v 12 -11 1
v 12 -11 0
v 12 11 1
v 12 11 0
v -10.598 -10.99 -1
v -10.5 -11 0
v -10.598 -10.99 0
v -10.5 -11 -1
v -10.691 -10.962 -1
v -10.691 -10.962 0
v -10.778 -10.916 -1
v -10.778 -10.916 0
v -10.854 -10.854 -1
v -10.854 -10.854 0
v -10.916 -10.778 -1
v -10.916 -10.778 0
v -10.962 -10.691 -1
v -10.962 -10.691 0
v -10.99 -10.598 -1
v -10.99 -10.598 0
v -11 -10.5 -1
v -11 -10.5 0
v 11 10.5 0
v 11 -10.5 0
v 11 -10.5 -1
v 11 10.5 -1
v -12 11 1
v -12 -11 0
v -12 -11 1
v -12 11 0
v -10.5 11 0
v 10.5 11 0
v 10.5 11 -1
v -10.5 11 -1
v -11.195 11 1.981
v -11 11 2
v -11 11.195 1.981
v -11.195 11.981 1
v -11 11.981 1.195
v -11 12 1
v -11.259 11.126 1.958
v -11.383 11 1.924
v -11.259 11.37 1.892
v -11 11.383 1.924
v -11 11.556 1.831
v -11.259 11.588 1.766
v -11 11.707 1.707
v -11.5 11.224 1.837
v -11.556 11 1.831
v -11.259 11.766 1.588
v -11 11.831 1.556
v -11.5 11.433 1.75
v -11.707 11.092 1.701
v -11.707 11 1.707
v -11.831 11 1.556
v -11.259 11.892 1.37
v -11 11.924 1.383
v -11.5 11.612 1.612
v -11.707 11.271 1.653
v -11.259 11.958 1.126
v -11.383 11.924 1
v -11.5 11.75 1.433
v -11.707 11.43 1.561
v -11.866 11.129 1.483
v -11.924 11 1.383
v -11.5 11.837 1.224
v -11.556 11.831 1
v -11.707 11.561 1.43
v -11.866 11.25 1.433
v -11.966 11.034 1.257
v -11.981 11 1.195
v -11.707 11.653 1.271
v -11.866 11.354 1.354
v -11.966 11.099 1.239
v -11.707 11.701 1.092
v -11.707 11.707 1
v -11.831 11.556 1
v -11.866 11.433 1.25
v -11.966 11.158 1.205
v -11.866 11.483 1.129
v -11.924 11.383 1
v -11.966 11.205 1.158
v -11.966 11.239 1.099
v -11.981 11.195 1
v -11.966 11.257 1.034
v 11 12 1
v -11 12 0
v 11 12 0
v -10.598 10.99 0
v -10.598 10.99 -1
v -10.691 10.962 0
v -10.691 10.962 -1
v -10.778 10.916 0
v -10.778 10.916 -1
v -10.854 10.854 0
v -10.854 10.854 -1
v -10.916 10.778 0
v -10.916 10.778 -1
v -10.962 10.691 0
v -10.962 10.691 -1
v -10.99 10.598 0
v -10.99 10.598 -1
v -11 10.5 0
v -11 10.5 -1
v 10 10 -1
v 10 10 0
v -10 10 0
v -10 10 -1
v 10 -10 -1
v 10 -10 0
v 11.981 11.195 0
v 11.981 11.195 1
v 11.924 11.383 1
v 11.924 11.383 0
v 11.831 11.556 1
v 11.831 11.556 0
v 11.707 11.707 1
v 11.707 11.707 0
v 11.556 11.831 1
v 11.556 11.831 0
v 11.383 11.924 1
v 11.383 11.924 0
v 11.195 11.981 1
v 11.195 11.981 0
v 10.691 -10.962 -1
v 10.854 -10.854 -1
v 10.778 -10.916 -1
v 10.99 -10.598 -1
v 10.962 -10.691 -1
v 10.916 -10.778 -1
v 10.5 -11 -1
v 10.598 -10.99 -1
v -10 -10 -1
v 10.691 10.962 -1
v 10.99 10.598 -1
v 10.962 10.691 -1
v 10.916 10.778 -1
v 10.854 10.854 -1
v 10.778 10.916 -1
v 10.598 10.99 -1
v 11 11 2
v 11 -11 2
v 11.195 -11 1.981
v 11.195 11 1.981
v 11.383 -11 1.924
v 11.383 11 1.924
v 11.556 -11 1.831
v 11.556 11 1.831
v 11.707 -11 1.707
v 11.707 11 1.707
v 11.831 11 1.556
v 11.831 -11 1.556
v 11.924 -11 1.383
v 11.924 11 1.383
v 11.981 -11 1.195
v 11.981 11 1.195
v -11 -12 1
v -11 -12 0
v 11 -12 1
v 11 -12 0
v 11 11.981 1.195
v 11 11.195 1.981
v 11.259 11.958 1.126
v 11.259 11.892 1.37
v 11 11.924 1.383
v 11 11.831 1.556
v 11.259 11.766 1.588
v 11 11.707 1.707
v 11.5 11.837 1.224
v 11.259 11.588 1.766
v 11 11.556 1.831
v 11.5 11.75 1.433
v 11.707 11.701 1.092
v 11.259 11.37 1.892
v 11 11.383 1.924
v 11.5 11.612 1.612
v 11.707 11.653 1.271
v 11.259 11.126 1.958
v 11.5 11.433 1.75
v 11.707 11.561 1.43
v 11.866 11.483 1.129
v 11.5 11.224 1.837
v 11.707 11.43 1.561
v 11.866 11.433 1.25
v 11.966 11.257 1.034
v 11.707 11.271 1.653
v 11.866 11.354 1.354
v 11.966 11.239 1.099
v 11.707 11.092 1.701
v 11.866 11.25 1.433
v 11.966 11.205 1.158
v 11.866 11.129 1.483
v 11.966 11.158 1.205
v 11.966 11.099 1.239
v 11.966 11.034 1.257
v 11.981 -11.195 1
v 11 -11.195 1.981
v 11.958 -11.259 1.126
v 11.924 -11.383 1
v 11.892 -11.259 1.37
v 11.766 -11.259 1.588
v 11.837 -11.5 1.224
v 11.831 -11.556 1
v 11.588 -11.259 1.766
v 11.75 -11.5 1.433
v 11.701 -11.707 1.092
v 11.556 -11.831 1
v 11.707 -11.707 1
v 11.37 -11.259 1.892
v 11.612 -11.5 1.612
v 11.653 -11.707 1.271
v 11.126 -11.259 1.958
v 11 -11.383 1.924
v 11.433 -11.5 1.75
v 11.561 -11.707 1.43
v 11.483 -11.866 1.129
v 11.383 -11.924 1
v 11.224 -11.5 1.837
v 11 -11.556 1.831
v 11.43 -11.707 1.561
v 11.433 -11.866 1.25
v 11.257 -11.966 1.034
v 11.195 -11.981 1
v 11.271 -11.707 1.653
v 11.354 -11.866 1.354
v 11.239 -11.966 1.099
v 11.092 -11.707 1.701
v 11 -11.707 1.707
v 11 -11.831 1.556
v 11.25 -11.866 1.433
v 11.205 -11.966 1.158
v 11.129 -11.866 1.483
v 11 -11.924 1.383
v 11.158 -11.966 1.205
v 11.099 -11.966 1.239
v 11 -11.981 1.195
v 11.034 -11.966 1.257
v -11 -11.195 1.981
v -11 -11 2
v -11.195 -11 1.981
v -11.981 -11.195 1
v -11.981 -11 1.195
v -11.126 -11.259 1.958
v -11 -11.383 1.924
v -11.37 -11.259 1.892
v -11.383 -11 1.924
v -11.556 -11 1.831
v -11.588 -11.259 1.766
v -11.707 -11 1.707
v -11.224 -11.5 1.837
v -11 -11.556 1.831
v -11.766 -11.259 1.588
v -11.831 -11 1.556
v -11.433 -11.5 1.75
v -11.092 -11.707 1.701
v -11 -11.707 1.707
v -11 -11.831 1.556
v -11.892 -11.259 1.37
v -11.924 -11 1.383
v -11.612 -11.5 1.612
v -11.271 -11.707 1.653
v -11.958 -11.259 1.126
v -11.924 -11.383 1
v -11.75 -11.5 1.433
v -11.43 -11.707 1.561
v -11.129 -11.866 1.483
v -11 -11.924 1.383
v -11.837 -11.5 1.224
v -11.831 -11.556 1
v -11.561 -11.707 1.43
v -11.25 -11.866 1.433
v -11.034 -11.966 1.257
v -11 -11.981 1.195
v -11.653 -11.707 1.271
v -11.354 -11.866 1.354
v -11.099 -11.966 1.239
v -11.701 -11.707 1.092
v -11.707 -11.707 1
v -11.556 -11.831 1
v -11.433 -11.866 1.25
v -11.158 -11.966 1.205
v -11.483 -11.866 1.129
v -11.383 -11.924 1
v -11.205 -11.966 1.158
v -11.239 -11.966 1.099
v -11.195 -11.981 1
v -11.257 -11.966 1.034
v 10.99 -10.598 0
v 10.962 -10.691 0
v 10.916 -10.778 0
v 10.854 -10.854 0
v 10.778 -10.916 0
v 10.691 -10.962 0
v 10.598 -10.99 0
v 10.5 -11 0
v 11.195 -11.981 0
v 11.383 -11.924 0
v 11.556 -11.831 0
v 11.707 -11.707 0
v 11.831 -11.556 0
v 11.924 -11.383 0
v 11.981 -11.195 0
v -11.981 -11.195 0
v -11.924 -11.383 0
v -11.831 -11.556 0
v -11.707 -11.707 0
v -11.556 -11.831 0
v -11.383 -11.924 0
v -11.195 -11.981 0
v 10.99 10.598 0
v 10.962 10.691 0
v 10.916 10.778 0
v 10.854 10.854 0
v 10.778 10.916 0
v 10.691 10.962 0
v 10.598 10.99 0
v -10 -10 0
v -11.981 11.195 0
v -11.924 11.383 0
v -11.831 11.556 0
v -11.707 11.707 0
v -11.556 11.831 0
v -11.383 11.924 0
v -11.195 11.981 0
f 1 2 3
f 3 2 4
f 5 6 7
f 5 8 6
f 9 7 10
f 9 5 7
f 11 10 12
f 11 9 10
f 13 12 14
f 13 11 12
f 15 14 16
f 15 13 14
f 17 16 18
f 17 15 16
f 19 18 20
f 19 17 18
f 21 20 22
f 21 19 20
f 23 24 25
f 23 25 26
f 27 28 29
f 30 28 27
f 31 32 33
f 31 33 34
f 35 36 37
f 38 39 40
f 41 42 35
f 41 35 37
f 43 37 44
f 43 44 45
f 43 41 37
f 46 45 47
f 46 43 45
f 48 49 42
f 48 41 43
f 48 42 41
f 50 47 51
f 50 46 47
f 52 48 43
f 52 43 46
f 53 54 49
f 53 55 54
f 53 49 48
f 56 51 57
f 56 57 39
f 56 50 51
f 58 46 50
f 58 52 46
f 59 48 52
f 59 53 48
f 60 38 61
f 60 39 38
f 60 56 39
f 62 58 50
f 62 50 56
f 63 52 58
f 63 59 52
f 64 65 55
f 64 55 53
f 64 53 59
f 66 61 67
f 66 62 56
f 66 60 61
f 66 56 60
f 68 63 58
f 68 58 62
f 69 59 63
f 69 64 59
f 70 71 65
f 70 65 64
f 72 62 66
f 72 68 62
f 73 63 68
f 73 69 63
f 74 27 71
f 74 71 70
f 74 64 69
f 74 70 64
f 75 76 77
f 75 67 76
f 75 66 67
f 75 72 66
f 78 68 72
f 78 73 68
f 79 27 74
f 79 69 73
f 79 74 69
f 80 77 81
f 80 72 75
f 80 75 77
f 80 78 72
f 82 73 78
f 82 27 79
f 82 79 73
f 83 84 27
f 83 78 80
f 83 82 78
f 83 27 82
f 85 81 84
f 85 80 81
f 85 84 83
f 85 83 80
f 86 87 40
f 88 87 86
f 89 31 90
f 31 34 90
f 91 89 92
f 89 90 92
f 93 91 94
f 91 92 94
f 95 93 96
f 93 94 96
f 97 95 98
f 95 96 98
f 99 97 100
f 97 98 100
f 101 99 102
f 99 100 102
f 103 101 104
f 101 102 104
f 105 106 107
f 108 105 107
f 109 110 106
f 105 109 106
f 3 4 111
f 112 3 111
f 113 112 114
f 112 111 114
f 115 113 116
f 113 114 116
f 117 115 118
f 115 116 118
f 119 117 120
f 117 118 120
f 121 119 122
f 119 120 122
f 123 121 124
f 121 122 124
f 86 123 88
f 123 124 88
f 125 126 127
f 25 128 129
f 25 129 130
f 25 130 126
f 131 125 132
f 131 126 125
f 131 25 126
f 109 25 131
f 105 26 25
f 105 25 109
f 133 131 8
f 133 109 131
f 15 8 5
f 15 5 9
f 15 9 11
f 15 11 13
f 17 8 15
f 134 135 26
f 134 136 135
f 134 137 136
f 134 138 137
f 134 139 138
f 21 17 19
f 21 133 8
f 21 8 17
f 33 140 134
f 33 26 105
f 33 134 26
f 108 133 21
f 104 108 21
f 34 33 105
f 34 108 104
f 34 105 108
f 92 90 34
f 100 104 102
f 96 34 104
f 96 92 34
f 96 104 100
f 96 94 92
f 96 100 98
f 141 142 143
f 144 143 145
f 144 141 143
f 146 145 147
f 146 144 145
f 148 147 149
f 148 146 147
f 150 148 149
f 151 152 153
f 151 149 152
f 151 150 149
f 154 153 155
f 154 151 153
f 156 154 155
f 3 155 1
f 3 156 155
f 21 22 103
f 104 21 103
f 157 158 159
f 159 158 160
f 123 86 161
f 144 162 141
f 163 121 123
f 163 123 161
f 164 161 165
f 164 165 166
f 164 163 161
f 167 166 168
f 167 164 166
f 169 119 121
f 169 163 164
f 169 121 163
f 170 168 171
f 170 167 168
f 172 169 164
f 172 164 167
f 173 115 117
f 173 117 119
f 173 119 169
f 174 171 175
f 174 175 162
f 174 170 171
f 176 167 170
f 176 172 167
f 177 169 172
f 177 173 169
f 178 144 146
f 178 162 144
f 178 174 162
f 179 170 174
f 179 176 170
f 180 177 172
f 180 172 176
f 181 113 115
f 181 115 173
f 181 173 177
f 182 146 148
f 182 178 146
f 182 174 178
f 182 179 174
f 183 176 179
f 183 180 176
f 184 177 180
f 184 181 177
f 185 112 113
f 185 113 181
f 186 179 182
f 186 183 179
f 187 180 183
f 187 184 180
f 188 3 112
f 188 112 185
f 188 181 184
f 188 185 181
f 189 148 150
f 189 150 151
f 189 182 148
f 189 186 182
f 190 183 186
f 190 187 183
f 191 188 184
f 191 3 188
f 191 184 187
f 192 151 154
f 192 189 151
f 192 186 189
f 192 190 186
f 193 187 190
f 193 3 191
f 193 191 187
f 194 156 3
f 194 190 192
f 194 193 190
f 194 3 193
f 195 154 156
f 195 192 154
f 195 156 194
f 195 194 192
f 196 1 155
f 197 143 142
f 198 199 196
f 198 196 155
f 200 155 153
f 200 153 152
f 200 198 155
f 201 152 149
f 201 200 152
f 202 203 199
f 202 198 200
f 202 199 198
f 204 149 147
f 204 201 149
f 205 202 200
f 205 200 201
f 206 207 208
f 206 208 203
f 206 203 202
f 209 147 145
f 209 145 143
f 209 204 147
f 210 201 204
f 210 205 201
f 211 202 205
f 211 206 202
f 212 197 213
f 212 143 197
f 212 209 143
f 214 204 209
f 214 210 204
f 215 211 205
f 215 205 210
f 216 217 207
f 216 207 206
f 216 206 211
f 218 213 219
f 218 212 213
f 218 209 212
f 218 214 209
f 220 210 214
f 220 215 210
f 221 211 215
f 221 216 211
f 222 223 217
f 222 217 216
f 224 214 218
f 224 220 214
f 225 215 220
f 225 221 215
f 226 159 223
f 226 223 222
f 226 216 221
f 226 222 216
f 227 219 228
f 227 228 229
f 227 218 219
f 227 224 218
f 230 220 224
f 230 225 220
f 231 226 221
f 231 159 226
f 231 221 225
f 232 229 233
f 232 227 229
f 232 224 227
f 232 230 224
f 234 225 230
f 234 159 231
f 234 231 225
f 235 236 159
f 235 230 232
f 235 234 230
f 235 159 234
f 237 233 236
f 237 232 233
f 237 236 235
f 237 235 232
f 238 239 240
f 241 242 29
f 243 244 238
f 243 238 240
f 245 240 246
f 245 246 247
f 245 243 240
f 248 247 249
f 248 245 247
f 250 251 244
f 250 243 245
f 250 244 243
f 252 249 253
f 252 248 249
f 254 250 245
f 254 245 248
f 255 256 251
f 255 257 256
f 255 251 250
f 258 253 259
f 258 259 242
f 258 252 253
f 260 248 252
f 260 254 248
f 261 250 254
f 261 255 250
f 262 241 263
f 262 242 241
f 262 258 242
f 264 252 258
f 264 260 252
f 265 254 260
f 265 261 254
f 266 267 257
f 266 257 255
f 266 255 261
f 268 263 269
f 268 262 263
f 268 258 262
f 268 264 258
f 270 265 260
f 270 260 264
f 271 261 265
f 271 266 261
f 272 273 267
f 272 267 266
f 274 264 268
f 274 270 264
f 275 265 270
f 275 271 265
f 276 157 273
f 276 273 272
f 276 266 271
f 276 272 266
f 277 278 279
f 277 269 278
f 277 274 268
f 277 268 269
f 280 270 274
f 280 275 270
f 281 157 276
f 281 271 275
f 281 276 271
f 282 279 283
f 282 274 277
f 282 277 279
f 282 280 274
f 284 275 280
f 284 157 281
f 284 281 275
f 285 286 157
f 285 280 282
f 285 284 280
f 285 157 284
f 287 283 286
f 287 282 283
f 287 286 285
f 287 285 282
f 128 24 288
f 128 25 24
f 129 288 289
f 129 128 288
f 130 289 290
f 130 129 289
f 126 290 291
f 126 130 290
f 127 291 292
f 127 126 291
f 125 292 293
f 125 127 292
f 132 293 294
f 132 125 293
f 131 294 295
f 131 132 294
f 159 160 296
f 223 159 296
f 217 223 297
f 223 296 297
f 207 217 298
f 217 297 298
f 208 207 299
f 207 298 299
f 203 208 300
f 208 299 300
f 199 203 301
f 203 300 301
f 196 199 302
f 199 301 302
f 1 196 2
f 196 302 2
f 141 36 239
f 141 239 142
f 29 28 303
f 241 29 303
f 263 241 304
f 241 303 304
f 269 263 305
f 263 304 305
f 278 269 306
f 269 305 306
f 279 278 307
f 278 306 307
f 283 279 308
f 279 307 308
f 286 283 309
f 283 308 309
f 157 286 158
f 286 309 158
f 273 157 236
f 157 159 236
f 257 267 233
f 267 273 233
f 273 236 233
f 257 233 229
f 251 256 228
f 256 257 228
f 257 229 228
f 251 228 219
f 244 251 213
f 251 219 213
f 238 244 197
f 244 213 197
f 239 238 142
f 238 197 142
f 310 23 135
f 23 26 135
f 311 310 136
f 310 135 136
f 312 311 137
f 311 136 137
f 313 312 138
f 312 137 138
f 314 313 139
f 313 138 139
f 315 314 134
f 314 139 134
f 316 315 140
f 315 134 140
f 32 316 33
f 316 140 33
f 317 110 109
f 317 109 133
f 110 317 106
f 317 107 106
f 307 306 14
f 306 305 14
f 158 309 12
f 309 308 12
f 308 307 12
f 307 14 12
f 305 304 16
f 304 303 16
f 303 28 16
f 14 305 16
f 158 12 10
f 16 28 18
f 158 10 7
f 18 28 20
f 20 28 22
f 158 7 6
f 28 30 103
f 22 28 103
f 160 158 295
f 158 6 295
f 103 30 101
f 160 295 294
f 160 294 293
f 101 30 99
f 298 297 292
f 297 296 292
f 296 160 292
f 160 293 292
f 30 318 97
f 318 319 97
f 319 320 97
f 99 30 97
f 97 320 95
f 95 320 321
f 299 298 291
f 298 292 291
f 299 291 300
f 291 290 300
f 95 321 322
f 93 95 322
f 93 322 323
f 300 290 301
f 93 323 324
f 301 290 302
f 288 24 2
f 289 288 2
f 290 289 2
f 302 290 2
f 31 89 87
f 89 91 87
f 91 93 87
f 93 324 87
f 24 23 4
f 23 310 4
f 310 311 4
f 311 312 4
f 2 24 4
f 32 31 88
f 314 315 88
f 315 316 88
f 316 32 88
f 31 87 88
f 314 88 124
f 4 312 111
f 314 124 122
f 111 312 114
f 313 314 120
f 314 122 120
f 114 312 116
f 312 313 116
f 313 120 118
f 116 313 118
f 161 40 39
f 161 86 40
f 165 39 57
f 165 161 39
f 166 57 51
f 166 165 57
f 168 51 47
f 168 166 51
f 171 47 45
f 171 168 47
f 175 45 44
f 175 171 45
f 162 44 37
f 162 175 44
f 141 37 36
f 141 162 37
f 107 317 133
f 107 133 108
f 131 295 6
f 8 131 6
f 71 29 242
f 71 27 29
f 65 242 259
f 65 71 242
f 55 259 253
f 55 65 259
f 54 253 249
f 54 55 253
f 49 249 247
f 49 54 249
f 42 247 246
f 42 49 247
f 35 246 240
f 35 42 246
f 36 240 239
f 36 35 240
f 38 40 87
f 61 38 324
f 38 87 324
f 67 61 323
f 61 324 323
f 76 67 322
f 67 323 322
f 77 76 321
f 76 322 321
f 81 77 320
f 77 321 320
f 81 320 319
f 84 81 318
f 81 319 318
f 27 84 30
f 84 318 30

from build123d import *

# Parameters (mm, degrees)
SKETCH1_W           = 24
SKETCH1_H           = 24
BOSS_EXTRUDE1_DEPTH = 2
SKETCH2_W           = 22
SKETCH2_H           = 22
SKETCH2_W_2         = 20
SKETCH2_H_2         = 20
BOSS_EXTRUDE2_DEPTH = 1
FILLET1_R           = 1
FILLET2_R           = 1
FILLET3_R           = 0.5


with BuildPart() as part:
    # Sketch1 → Boss-Extrude1 (new body)
    with BuildSketch(Plane.XY):
        Rectangle(SKETCH1_W, SKETCH1_H)
    extrude(amount=BOSS_EXTRUDE1_DEPTH)

    # Sketch2 → Boss-Extrude2 (add)
    with BuildSketch(Plane(origin=(0, 0, 0), x_dir=(-1, 0, 0), z_dir=(0, 0, -1))):
        Rectangle(SKETCH2_W, SKETCH2_H)
        Rectangle(SKETCH2_W_2, SKETCH2_H_2, mode=Mode.SUBTRACT)
    extrude(amount=BOSS_EXTRUDE2_DEPTH)

    # Fillet1
    fillet1_edges = [part.edges().sort_by_distance(p)[0] for p in [
        (-12, 0, 2),
        (0, -12, 2),
        (12, 0, 2),
        (0, 12, 2),
    ]]
    fillet(fillet1_edges, radius=FILLET1_R)

    # Fillet2
    # the kernel refuses this fillet: 1 mm, written as the material it takes off along each edge
    with BuildSketch(Plane(origin=(-11, -11, 1), x_dir=(-1, 0, 0), z_dir=(0, -1, 0))) as fillet2_piece_1_section:
        Polygon((0, 0), (FILLET2_R, 0), (FILLET2_R, -FILLET2_R), (0, -FILLET2_R), align=None)
    fillet2_piece_1 = extrude(amount=FILLET2_R, mode=Mode.PRIVATE)
    fillet2_piece_1 = fillet2_piece_1 - Plane(origin=(-11, -11, 1), x_dir=(0.7071067811865475, 0, -0.7071067811865475), z_dir=(0, -1, 0)) * Sphere(FILLET2_R, mode=Mode.PRIVATE)
    add(fillet2_piece_1, mode=Mode.SUBTRACT)
    with BuildSketch(Plane(origin=(-11, 11, 1), x_dir=(0, 1, 0), z_dir=(-1, 0, 0))) as fillet2_piece_2_section:
        Polygon((0, 0), (FILLET2_R, 0), (FILLET2_R, -FILLET2_R), (0, -FILLET2_R), align=None)
    fillet2_piece_2 = extrude(amount=FILLET2_R, mode=Mode.PRIVATE)
    fillet2_piece_2 = fillet2_piece_2 - Plane(origin=(-11, 11, 1), x_dir=(0, -0.7071067811865475, -0.7071067811865475), z_dir=(-1, 0, 0)) * Sphere(FILLET2_R, mode=Mode.PRIVATE)
    add(fillet2_piece_2, mode=Mode.SUBTRACT)
    with BuildSketch(Plane(origin=(11, -11, 1), x_dir=(1, 0, 0), z_dir=(0, -1, 0))) as fillet2_piece_3_section:
        Polygon((0, 0), (FILLET2_R, 0), (FILLET2_R, FILLET2_R), (0, FILLET2_R), align=None)
    fillet2_piece_3 = extrude(amount=FILLET2_R, mode=Mode.PRIVATE)
    fillet2_piece_3 = fillet2_piece_3 - Plane(origin=(11, -11, 1), x_dir=(-0.7071067811865475, 0, -0.7071067811865475), z_dir=(0, -1, 0)) * Sphere(FILLET2_R, mode=Mode.PRIVATE)
    add(fillet2_piece_3, mode=Mode.SUBTRACT)
    with BuildSketch(Plane(origin=(11, 11, 1), x_dir=(0, 1, 0), z_dir=(1, 0, 0))) as fillet2_piece_4_section:
        Polygon((0, 0), (FILLET2_R, 0), (FILLET2_R, FILLET2_R), (0, FILLET2_R), align=None)
    fillet2_piece_4 = extrude(amount=FILLET2_R, mode=Mode.PRIVATE)
    fillet2_piece_4 = fillet2_piece_4 - Plane(origin=(11, 11, 1), x_dir=(0, -0.7071067811865475, -0.7071067811865475), z_dir=(1, 0, 0)) * Sphere(FILLET2_R, mode=Mode.PRIVATE)
    add(fillet2_piece_4, mode=Mode.SUBTRACT)
    with BuildSketch(Plane(origin=(12, 12, -2.5), x_dir=(0, -1, 0), z_dir=(0, 0, 1)), Plane(origin=(12, -12, -2.5), x_dir=(-1, 0, 0), z_dir=(0, 0, 1))) as fillet2_piece_5:
        with BuildLine():
            CenterArc((FILLET2_R, -FILLET2_R), FILLET2_R, 90, 90)
            Line((0, -FILLET2_R), (0, 0))
            Line((0, 0), (FILLET2_R, 0))
        make_face()
    extrude(amount=3.5, mode=Mode.SUBTRACT)
    with BuildSketch(Plane(origin=(-12, -12, -2.5), x_dir=(1, 0, 0), z_dir=(0, 0, 1)), Plane(origin=(-12, 12, -2.5), x_dir=(0, -1, 0), z_dir=(0, 0, 1))) as fillet2_piece_6:
        with BuildLine():
            CenterArc((FILLET2_R, FILLET2_R), FILLET2_R, 180, 90)
            Line((0, FILLET2_R), (0, 0))
            Line((0, 0), (FILLET2_R, 0))
        make_face()
    extrude(amount=3.5, mode=Mode.SUBTRACT)

    # Fillet3
    fillet3_edges = [part.edges().sort_by_distance(p)[0] for p in [
        (-11, -11, -0.5),
        (-11, 11, -0.5),
        (11, 11, -0.5),
        (11, -11, -0.5),
    ]]
    fillet(fillet3_edges, radius=FILLET3_R)


solid = part.part
